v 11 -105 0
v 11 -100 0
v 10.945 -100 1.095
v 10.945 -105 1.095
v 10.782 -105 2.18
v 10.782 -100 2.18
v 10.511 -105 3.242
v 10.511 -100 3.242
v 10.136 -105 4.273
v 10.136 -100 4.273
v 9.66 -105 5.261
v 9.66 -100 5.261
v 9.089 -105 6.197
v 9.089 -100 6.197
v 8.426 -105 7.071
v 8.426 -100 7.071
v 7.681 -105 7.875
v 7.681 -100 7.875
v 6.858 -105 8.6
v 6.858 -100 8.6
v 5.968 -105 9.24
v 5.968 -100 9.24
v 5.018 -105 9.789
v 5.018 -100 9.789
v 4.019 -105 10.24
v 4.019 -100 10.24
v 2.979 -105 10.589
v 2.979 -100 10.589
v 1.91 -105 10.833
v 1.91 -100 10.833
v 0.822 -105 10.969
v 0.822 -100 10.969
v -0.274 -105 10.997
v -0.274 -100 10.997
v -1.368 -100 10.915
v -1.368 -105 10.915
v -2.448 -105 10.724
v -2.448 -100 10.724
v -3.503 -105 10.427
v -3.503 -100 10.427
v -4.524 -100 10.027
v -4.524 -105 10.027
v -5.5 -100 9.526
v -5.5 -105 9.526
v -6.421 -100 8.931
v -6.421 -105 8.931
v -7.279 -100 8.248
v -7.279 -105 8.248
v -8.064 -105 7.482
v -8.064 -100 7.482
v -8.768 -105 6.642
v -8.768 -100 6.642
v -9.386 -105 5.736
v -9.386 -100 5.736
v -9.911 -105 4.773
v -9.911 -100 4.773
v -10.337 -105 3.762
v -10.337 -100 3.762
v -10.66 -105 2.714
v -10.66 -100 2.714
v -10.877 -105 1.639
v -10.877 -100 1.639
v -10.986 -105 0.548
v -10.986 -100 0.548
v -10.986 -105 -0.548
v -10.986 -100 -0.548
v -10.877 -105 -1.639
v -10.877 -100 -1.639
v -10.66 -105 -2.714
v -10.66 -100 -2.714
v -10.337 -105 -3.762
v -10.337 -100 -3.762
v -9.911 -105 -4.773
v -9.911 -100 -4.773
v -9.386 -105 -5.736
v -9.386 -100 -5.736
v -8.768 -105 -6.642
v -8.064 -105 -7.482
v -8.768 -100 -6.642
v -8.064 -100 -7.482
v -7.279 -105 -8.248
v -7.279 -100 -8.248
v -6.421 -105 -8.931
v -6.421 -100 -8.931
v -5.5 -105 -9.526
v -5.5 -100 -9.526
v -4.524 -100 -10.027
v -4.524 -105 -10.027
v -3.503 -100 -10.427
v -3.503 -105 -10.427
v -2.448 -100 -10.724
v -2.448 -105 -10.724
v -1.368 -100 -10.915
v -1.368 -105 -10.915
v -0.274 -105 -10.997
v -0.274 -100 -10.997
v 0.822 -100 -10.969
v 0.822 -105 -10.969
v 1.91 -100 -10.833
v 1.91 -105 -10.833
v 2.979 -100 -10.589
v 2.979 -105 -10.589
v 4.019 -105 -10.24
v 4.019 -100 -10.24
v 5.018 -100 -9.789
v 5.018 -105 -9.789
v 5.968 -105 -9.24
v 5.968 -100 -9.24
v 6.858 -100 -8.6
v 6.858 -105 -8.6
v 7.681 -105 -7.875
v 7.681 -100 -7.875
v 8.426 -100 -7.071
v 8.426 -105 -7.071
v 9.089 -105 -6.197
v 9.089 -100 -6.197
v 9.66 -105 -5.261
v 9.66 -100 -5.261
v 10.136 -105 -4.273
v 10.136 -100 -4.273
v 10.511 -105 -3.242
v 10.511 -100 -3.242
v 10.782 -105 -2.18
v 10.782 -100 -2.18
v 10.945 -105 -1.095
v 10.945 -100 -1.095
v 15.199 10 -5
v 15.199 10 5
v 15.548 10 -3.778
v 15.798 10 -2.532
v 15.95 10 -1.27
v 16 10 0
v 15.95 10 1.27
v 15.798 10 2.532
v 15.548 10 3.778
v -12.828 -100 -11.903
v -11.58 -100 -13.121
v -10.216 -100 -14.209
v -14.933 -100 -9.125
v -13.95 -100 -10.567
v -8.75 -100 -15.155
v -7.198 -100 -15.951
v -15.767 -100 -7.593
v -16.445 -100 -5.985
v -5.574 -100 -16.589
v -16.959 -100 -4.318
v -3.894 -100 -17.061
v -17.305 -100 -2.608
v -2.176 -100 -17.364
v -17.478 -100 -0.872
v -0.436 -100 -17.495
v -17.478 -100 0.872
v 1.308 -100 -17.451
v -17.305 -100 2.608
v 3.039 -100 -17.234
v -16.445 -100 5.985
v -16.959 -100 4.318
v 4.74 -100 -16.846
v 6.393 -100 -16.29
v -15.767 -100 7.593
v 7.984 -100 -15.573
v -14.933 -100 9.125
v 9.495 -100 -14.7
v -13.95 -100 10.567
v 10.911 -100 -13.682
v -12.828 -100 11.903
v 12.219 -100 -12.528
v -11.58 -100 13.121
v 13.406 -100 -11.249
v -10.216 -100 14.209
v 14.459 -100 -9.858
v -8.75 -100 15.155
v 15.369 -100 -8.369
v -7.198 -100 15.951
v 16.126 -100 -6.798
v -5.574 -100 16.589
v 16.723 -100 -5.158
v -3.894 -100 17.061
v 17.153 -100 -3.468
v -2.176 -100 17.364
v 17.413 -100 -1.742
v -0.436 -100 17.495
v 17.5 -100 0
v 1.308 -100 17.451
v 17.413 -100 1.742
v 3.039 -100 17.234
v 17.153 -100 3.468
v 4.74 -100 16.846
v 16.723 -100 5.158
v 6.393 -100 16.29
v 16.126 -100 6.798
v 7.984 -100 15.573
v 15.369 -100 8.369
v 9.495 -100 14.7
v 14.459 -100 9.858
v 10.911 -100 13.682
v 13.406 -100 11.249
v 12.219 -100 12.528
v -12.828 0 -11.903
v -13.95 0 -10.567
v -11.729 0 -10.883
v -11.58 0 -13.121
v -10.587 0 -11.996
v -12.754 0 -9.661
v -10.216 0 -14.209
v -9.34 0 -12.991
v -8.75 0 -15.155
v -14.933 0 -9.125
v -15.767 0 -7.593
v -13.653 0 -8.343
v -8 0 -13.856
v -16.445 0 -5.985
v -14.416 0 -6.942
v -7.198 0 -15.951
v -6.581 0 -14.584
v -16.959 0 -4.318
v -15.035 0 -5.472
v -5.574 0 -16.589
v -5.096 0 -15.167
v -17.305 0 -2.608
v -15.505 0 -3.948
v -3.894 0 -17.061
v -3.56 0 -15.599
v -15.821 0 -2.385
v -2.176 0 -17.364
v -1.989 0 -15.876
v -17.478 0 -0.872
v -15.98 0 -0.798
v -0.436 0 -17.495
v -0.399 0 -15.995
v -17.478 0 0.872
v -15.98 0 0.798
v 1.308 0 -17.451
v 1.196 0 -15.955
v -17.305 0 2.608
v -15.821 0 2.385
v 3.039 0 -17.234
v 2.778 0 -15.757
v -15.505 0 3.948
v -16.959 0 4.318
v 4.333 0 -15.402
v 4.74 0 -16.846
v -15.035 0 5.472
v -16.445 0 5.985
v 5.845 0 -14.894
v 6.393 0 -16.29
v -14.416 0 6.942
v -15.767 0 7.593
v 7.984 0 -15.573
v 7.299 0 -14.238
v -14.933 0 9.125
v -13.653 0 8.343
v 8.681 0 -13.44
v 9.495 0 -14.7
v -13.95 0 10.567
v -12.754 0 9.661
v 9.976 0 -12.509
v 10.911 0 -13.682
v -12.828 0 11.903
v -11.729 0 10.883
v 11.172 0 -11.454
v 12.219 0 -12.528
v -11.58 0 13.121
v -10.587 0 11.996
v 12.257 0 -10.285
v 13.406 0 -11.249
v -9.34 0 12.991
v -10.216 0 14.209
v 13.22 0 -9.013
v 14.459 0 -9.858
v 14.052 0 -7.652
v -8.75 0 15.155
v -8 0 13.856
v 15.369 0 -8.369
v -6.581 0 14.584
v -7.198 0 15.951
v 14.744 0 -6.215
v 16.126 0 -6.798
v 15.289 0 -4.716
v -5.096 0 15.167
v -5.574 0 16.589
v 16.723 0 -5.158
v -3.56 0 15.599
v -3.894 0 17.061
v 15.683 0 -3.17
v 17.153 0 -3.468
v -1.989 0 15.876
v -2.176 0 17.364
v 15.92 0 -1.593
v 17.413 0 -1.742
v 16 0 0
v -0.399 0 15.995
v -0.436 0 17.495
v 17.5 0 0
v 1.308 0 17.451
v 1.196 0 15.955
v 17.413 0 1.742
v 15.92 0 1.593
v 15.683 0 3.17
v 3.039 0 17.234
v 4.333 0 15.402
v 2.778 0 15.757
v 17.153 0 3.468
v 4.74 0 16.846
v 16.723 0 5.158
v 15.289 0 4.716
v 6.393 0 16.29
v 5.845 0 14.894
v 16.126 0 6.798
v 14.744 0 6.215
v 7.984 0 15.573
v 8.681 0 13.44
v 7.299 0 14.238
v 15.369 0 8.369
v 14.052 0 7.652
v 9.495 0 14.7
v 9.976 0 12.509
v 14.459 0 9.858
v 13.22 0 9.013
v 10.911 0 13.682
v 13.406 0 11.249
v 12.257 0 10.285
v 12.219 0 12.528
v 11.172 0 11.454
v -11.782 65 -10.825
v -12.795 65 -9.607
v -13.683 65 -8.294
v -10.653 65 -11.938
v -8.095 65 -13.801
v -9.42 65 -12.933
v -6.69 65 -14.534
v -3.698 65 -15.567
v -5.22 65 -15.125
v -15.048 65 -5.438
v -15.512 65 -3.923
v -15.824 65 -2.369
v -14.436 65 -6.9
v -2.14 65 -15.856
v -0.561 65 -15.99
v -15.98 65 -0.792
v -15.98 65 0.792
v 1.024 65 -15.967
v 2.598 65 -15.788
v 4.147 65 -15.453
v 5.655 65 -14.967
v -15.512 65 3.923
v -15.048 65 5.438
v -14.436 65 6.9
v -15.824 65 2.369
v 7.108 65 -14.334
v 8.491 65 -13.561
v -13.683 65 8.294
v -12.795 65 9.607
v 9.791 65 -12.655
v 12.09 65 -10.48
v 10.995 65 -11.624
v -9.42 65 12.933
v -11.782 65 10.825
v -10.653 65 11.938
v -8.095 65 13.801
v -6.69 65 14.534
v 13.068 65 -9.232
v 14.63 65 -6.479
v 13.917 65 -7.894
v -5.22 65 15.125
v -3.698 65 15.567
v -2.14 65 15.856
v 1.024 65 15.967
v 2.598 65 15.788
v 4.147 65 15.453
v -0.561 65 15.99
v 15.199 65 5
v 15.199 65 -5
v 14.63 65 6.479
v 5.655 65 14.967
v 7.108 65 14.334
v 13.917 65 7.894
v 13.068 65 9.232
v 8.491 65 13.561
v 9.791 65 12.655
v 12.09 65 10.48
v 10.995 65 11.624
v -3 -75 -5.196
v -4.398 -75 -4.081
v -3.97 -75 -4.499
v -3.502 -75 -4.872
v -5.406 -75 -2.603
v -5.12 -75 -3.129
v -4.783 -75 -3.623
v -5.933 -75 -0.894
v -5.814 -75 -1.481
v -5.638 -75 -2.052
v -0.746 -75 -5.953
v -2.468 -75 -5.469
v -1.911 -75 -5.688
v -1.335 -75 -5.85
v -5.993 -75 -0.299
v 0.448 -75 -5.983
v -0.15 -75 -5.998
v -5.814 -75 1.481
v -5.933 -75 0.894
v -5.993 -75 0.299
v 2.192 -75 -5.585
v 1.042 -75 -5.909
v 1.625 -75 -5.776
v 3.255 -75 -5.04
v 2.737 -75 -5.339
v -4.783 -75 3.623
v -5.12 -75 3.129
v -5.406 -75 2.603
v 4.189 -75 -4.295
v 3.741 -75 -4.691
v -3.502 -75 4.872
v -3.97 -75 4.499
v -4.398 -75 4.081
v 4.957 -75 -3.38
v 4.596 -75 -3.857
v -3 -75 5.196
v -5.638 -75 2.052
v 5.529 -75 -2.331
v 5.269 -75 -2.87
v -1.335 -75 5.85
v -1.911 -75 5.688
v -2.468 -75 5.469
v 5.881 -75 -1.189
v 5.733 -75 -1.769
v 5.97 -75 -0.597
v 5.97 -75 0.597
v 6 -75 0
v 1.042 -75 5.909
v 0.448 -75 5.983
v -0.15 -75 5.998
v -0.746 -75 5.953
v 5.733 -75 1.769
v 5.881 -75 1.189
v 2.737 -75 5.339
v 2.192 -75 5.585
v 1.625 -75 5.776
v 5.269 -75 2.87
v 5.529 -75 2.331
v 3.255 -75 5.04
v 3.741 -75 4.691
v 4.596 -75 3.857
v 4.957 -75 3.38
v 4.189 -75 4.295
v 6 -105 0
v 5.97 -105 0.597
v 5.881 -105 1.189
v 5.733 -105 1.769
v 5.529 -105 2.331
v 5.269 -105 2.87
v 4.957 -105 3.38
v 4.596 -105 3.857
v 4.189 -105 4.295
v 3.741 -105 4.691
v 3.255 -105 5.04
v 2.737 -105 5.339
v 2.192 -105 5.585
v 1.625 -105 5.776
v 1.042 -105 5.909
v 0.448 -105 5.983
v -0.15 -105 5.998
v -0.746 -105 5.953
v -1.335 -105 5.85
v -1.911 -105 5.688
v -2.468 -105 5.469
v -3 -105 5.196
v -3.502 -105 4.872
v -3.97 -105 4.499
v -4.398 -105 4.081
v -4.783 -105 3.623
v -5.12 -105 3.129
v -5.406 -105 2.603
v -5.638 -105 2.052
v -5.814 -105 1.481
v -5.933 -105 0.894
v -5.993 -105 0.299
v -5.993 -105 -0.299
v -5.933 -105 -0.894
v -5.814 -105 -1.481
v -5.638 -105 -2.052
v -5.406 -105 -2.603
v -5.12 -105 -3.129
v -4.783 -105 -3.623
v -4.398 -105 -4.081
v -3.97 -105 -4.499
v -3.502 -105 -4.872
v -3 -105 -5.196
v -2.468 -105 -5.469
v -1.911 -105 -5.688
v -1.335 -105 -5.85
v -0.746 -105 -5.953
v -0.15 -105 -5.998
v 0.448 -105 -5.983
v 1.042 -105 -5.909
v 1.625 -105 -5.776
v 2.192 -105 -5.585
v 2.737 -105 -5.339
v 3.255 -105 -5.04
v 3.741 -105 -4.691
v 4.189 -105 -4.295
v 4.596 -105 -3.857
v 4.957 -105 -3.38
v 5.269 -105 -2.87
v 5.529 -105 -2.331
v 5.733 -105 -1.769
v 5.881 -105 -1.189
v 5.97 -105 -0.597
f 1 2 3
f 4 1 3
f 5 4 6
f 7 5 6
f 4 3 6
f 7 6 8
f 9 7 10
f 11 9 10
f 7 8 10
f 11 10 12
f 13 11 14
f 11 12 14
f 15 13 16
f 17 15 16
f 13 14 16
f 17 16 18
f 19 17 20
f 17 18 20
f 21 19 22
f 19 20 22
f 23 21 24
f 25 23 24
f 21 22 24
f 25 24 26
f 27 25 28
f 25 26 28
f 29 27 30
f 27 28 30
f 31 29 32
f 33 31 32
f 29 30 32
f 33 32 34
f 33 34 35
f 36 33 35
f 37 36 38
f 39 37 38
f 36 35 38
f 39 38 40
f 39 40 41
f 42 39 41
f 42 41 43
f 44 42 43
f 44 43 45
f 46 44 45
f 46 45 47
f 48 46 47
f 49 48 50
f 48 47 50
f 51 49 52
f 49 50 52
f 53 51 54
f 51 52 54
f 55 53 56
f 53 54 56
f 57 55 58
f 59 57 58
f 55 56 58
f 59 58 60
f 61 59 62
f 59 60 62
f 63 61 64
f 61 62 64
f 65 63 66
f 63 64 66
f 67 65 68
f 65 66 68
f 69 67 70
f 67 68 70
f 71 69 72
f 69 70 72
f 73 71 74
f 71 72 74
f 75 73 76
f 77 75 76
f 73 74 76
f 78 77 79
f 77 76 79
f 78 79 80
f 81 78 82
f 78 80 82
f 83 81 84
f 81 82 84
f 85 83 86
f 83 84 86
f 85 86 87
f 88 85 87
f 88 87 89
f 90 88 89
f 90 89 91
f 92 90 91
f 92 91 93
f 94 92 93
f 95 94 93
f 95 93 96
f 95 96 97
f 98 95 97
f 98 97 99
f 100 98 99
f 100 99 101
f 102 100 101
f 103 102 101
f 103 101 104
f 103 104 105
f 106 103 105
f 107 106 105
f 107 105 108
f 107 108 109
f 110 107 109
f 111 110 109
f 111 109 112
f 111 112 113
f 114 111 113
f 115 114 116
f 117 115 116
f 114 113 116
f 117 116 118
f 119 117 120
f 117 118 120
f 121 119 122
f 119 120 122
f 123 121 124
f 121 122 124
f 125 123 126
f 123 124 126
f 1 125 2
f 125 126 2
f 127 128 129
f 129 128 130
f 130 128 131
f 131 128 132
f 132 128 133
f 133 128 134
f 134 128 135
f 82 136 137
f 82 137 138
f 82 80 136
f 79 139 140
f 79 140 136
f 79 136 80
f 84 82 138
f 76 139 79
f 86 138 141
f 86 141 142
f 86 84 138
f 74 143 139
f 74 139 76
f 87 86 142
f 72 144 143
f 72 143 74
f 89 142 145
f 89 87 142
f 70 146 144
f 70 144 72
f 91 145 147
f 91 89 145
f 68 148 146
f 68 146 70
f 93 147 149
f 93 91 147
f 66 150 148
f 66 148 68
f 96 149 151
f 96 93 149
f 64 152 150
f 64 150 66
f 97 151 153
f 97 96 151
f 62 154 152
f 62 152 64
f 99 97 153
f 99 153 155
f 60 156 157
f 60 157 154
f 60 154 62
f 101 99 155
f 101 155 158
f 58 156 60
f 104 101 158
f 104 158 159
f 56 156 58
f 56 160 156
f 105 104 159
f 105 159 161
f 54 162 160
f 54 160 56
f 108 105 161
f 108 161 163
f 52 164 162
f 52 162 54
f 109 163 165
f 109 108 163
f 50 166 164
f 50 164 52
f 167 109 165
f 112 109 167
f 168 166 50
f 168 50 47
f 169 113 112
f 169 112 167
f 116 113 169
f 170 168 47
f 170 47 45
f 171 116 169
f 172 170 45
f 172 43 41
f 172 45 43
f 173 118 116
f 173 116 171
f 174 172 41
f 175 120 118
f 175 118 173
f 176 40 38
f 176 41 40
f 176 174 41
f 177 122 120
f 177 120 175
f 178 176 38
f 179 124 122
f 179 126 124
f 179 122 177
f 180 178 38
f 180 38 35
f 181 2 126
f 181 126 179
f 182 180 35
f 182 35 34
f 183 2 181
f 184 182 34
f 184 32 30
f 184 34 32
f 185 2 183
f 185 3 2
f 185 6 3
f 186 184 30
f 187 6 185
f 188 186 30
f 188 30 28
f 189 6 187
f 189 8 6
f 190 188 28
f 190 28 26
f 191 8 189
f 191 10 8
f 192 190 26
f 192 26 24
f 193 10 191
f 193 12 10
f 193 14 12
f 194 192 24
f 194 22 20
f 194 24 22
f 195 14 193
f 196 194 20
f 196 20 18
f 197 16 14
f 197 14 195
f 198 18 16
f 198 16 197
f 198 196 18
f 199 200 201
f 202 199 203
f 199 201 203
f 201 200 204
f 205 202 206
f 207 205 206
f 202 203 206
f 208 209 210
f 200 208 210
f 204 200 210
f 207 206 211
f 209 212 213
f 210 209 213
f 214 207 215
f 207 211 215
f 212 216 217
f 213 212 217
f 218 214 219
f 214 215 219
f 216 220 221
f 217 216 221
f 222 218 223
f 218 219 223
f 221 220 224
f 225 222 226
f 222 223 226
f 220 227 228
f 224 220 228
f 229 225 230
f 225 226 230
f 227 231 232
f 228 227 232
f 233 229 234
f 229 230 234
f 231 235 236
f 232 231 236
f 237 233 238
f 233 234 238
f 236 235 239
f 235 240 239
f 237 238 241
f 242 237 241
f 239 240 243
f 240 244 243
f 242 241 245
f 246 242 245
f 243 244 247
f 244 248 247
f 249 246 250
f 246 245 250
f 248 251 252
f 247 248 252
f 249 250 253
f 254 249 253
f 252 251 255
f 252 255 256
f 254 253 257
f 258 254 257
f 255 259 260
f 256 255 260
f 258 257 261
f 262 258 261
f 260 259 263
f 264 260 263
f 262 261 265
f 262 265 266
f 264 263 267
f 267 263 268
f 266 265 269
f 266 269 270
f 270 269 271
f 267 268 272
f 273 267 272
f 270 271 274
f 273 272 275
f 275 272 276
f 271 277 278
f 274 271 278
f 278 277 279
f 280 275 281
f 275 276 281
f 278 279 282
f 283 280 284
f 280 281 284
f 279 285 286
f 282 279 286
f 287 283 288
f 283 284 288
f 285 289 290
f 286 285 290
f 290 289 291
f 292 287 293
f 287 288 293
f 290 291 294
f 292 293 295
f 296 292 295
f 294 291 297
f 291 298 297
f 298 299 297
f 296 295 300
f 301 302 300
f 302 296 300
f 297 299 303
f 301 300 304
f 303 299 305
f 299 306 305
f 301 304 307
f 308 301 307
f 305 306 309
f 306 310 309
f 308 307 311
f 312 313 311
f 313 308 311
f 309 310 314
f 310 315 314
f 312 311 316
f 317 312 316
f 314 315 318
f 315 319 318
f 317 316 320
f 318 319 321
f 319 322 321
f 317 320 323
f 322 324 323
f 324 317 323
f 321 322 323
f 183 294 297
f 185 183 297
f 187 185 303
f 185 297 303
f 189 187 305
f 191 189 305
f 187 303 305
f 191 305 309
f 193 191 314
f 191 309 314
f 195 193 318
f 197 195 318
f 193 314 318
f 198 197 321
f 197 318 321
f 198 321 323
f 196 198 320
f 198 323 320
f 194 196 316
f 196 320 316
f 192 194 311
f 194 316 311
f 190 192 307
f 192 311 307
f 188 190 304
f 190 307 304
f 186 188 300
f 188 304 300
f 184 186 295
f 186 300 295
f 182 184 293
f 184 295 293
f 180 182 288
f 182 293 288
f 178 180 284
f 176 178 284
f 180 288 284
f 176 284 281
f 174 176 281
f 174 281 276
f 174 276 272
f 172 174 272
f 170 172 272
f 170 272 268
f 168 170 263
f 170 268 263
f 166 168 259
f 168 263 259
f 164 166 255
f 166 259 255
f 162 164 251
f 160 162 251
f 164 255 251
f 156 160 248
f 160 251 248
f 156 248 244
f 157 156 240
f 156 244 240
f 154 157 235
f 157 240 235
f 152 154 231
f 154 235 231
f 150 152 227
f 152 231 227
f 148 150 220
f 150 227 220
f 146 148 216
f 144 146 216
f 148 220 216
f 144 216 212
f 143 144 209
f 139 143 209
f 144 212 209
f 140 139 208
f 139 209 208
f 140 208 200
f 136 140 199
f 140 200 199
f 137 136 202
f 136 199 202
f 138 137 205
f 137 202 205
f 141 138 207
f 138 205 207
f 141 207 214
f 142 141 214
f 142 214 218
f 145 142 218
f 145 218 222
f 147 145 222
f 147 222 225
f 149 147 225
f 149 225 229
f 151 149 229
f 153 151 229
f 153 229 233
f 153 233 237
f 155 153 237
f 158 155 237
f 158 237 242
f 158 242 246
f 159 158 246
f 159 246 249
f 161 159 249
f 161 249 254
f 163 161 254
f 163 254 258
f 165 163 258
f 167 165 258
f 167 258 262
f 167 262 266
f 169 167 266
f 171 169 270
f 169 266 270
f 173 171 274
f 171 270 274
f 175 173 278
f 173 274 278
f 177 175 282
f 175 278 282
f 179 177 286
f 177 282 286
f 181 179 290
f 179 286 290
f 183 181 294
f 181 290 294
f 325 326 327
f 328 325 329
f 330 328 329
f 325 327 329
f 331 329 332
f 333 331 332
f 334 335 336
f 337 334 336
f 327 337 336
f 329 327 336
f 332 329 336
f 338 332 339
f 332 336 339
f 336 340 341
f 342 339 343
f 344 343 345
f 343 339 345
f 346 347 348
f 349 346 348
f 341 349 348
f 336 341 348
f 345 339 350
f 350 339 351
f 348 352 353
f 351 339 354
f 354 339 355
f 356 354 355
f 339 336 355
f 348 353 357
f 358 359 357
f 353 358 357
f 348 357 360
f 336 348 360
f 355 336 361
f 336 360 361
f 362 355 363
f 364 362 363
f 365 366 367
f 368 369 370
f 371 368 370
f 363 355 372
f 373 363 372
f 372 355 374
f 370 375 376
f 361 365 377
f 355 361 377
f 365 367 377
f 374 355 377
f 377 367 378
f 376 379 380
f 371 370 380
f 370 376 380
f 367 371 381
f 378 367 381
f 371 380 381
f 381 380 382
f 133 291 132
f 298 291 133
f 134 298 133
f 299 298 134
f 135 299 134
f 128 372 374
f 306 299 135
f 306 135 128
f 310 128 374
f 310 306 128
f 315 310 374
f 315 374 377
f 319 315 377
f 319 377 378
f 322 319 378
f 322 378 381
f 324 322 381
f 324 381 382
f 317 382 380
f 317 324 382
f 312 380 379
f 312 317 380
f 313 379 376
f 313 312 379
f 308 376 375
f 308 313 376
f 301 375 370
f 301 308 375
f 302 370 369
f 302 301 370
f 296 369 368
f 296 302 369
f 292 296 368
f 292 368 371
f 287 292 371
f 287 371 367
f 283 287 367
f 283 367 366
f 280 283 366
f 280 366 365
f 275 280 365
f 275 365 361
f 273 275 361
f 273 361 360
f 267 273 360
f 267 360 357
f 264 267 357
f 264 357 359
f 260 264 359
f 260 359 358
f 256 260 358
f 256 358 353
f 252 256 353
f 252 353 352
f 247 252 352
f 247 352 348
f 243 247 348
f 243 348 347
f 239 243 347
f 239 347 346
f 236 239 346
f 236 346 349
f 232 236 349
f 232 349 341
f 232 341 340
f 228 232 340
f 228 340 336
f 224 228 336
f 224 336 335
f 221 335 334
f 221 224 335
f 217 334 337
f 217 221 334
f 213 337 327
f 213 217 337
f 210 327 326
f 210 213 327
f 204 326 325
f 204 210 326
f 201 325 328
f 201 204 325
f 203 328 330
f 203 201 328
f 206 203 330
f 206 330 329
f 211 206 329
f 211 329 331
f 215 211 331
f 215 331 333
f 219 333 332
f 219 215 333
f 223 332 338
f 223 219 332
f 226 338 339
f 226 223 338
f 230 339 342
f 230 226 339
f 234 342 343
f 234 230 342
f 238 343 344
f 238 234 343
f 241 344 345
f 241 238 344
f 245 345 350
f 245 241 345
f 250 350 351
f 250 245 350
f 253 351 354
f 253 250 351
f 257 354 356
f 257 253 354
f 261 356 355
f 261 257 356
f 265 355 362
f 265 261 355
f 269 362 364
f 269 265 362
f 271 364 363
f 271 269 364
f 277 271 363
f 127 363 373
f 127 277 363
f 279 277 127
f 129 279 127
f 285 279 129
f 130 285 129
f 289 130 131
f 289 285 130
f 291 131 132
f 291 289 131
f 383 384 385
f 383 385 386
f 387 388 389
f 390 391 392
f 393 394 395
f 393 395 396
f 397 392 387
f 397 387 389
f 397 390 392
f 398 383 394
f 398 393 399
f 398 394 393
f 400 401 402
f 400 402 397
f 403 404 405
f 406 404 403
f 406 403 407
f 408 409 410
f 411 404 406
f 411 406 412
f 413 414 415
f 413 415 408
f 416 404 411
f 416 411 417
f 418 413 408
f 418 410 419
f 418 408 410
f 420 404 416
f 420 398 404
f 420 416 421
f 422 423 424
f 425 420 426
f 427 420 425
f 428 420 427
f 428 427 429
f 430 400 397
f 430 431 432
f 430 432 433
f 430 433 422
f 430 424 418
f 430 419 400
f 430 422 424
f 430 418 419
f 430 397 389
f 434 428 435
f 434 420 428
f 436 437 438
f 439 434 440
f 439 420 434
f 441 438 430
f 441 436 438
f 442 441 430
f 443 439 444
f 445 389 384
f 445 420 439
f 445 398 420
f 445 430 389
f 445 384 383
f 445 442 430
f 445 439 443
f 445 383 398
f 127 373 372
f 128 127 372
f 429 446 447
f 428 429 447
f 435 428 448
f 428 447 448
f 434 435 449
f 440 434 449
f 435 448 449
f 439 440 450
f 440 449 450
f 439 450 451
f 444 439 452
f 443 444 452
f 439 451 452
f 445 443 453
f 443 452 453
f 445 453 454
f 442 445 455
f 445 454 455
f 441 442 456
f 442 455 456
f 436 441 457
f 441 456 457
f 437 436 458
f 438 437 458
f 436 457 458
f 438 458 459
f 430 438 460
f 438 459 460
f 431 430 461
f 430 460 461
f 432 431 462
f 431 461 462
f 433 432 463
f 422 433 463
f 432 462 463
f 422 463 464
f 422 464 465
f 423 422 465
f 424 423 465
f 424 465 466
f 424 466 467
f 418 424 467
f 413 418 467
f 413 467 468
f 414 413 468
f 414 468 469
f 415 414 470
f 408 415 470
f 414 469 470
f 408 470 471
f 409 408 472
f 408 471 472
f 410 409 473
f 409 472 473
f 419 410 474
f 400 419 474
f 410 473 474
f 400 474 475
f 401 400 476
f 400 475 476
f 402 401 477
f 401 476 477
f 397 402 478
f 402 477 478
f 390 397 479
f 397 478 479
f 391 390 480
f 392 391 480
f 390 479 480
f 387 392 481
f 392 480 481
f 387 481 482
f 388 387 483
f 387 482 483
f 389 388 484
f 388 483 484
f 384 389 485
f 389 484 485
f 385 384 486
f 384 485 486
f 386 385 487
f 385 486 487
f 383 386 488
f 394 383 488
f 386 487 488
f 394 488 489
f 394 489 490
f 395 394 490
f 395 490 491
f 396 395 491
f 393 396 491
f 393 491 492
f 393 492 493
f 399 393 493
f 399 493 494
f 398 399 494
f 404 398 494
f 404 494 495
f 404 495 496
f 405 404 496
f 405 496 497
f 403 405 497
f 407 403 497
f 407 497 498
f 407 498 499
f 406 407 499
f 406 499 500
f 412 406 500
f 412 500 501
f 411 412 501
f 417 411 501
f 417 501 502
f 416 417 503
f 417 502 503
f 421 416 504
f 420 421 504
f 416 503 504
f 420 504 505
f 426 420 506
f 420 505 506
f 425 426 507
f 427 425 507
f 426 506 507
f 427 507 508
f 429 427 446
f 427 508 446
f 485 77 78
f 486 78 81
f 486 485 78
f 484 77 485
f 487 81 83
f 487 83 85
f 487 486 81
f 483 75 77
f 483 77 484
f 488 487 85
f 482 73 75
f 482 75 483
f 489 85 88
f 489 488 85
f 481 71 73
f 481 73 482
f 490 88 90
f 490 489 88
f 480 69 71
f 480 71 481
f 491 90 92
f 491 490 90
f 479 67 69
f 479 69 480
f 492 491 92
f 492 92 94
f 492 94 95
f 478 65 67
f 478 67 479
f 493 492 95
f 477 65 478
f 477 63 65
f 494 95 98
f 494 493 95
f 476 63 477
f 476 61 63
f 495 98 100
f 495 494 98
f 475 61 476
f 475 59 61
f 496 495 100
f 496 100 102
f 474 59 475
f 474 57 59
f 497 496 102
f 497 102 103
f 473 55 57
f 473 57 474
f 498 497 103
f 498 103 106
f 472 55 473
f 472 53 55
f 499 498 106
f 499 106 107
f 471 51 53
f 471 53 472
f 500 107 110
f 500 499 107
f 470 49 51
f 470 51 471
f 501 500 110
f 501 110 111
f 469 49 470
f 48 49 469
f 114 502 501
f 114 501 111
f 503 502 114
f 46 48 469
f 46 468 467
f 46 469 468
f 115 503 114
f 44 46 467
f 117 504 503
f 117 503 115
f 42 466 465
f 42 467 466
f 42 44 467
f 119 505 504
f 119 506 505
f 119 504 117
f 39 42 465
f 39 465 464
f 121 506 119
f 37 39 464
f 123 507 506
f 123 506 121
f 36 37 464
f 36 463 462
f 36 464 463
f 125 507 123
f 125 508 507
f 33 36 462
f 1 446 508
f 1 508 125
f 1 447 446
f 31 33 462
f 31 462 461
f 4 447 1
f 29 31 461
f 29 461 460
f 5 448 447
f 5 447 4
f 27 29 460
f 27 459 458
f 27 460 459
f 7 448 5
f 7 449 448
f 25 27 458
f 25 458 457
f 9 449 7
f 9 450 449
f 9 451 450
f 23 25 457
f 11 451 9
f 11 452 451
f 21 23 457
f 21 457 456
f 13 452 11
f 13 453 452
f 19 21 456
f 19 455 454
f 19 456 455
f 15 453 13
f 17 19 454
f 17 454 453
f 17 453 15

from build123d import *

# Parameters (mm, degrees)
F0_R     = 17.5
F1_DEPTH = 100
F2_R     = 11
F3_DEPTH = 5
F4_R     = 6
F5_DEPTH = 30
F6_R     = 16
F7_DEPTH = 65
F8_W     = 5.652177
F8_H     = 10
F9_DEPTH = 55


with BuildPart() as f1:
    # F0 (on Front) → F1 (new body)
    with BuildSketch(Plane.XZ):
        Circle(F0_R)
    extrude(amount=F1_DEPTH)

    # F2 (on face) → F3 (join)
    with BuildSketch(Plane.XZ.offset(100)):
        Circle(F2_R)
    extrude(amount=F3_DEPTH)

    # F4 (on face) → F5 (cut)
    with BuildSketch(Plane.XZ.offset(105)):
        Circle(F4_R)
    extrude(amount=-F5_DEPTH, mode=Mode.SUBTRACT)

    # F6 (on Front) → F7 (join)
    with BuildSketch(Plane.XZ):
        Circle(F6_R)
    extrude(amount=-F7_DEPTH)

    # F8 (on face) → F9 (cut)
    with BuildSketch(Plane(origin=(0, 65, 0), x_dir=(-1, 0, 0), z_dir=(0, 1, 0))):
        with Locations((-18.024772, 0)):
            Rectangle(F8_W, F8_H)
    extrude(amount=-F9_DEPTH, mode=Mode.SUBTRACT)


solid = f1.part
